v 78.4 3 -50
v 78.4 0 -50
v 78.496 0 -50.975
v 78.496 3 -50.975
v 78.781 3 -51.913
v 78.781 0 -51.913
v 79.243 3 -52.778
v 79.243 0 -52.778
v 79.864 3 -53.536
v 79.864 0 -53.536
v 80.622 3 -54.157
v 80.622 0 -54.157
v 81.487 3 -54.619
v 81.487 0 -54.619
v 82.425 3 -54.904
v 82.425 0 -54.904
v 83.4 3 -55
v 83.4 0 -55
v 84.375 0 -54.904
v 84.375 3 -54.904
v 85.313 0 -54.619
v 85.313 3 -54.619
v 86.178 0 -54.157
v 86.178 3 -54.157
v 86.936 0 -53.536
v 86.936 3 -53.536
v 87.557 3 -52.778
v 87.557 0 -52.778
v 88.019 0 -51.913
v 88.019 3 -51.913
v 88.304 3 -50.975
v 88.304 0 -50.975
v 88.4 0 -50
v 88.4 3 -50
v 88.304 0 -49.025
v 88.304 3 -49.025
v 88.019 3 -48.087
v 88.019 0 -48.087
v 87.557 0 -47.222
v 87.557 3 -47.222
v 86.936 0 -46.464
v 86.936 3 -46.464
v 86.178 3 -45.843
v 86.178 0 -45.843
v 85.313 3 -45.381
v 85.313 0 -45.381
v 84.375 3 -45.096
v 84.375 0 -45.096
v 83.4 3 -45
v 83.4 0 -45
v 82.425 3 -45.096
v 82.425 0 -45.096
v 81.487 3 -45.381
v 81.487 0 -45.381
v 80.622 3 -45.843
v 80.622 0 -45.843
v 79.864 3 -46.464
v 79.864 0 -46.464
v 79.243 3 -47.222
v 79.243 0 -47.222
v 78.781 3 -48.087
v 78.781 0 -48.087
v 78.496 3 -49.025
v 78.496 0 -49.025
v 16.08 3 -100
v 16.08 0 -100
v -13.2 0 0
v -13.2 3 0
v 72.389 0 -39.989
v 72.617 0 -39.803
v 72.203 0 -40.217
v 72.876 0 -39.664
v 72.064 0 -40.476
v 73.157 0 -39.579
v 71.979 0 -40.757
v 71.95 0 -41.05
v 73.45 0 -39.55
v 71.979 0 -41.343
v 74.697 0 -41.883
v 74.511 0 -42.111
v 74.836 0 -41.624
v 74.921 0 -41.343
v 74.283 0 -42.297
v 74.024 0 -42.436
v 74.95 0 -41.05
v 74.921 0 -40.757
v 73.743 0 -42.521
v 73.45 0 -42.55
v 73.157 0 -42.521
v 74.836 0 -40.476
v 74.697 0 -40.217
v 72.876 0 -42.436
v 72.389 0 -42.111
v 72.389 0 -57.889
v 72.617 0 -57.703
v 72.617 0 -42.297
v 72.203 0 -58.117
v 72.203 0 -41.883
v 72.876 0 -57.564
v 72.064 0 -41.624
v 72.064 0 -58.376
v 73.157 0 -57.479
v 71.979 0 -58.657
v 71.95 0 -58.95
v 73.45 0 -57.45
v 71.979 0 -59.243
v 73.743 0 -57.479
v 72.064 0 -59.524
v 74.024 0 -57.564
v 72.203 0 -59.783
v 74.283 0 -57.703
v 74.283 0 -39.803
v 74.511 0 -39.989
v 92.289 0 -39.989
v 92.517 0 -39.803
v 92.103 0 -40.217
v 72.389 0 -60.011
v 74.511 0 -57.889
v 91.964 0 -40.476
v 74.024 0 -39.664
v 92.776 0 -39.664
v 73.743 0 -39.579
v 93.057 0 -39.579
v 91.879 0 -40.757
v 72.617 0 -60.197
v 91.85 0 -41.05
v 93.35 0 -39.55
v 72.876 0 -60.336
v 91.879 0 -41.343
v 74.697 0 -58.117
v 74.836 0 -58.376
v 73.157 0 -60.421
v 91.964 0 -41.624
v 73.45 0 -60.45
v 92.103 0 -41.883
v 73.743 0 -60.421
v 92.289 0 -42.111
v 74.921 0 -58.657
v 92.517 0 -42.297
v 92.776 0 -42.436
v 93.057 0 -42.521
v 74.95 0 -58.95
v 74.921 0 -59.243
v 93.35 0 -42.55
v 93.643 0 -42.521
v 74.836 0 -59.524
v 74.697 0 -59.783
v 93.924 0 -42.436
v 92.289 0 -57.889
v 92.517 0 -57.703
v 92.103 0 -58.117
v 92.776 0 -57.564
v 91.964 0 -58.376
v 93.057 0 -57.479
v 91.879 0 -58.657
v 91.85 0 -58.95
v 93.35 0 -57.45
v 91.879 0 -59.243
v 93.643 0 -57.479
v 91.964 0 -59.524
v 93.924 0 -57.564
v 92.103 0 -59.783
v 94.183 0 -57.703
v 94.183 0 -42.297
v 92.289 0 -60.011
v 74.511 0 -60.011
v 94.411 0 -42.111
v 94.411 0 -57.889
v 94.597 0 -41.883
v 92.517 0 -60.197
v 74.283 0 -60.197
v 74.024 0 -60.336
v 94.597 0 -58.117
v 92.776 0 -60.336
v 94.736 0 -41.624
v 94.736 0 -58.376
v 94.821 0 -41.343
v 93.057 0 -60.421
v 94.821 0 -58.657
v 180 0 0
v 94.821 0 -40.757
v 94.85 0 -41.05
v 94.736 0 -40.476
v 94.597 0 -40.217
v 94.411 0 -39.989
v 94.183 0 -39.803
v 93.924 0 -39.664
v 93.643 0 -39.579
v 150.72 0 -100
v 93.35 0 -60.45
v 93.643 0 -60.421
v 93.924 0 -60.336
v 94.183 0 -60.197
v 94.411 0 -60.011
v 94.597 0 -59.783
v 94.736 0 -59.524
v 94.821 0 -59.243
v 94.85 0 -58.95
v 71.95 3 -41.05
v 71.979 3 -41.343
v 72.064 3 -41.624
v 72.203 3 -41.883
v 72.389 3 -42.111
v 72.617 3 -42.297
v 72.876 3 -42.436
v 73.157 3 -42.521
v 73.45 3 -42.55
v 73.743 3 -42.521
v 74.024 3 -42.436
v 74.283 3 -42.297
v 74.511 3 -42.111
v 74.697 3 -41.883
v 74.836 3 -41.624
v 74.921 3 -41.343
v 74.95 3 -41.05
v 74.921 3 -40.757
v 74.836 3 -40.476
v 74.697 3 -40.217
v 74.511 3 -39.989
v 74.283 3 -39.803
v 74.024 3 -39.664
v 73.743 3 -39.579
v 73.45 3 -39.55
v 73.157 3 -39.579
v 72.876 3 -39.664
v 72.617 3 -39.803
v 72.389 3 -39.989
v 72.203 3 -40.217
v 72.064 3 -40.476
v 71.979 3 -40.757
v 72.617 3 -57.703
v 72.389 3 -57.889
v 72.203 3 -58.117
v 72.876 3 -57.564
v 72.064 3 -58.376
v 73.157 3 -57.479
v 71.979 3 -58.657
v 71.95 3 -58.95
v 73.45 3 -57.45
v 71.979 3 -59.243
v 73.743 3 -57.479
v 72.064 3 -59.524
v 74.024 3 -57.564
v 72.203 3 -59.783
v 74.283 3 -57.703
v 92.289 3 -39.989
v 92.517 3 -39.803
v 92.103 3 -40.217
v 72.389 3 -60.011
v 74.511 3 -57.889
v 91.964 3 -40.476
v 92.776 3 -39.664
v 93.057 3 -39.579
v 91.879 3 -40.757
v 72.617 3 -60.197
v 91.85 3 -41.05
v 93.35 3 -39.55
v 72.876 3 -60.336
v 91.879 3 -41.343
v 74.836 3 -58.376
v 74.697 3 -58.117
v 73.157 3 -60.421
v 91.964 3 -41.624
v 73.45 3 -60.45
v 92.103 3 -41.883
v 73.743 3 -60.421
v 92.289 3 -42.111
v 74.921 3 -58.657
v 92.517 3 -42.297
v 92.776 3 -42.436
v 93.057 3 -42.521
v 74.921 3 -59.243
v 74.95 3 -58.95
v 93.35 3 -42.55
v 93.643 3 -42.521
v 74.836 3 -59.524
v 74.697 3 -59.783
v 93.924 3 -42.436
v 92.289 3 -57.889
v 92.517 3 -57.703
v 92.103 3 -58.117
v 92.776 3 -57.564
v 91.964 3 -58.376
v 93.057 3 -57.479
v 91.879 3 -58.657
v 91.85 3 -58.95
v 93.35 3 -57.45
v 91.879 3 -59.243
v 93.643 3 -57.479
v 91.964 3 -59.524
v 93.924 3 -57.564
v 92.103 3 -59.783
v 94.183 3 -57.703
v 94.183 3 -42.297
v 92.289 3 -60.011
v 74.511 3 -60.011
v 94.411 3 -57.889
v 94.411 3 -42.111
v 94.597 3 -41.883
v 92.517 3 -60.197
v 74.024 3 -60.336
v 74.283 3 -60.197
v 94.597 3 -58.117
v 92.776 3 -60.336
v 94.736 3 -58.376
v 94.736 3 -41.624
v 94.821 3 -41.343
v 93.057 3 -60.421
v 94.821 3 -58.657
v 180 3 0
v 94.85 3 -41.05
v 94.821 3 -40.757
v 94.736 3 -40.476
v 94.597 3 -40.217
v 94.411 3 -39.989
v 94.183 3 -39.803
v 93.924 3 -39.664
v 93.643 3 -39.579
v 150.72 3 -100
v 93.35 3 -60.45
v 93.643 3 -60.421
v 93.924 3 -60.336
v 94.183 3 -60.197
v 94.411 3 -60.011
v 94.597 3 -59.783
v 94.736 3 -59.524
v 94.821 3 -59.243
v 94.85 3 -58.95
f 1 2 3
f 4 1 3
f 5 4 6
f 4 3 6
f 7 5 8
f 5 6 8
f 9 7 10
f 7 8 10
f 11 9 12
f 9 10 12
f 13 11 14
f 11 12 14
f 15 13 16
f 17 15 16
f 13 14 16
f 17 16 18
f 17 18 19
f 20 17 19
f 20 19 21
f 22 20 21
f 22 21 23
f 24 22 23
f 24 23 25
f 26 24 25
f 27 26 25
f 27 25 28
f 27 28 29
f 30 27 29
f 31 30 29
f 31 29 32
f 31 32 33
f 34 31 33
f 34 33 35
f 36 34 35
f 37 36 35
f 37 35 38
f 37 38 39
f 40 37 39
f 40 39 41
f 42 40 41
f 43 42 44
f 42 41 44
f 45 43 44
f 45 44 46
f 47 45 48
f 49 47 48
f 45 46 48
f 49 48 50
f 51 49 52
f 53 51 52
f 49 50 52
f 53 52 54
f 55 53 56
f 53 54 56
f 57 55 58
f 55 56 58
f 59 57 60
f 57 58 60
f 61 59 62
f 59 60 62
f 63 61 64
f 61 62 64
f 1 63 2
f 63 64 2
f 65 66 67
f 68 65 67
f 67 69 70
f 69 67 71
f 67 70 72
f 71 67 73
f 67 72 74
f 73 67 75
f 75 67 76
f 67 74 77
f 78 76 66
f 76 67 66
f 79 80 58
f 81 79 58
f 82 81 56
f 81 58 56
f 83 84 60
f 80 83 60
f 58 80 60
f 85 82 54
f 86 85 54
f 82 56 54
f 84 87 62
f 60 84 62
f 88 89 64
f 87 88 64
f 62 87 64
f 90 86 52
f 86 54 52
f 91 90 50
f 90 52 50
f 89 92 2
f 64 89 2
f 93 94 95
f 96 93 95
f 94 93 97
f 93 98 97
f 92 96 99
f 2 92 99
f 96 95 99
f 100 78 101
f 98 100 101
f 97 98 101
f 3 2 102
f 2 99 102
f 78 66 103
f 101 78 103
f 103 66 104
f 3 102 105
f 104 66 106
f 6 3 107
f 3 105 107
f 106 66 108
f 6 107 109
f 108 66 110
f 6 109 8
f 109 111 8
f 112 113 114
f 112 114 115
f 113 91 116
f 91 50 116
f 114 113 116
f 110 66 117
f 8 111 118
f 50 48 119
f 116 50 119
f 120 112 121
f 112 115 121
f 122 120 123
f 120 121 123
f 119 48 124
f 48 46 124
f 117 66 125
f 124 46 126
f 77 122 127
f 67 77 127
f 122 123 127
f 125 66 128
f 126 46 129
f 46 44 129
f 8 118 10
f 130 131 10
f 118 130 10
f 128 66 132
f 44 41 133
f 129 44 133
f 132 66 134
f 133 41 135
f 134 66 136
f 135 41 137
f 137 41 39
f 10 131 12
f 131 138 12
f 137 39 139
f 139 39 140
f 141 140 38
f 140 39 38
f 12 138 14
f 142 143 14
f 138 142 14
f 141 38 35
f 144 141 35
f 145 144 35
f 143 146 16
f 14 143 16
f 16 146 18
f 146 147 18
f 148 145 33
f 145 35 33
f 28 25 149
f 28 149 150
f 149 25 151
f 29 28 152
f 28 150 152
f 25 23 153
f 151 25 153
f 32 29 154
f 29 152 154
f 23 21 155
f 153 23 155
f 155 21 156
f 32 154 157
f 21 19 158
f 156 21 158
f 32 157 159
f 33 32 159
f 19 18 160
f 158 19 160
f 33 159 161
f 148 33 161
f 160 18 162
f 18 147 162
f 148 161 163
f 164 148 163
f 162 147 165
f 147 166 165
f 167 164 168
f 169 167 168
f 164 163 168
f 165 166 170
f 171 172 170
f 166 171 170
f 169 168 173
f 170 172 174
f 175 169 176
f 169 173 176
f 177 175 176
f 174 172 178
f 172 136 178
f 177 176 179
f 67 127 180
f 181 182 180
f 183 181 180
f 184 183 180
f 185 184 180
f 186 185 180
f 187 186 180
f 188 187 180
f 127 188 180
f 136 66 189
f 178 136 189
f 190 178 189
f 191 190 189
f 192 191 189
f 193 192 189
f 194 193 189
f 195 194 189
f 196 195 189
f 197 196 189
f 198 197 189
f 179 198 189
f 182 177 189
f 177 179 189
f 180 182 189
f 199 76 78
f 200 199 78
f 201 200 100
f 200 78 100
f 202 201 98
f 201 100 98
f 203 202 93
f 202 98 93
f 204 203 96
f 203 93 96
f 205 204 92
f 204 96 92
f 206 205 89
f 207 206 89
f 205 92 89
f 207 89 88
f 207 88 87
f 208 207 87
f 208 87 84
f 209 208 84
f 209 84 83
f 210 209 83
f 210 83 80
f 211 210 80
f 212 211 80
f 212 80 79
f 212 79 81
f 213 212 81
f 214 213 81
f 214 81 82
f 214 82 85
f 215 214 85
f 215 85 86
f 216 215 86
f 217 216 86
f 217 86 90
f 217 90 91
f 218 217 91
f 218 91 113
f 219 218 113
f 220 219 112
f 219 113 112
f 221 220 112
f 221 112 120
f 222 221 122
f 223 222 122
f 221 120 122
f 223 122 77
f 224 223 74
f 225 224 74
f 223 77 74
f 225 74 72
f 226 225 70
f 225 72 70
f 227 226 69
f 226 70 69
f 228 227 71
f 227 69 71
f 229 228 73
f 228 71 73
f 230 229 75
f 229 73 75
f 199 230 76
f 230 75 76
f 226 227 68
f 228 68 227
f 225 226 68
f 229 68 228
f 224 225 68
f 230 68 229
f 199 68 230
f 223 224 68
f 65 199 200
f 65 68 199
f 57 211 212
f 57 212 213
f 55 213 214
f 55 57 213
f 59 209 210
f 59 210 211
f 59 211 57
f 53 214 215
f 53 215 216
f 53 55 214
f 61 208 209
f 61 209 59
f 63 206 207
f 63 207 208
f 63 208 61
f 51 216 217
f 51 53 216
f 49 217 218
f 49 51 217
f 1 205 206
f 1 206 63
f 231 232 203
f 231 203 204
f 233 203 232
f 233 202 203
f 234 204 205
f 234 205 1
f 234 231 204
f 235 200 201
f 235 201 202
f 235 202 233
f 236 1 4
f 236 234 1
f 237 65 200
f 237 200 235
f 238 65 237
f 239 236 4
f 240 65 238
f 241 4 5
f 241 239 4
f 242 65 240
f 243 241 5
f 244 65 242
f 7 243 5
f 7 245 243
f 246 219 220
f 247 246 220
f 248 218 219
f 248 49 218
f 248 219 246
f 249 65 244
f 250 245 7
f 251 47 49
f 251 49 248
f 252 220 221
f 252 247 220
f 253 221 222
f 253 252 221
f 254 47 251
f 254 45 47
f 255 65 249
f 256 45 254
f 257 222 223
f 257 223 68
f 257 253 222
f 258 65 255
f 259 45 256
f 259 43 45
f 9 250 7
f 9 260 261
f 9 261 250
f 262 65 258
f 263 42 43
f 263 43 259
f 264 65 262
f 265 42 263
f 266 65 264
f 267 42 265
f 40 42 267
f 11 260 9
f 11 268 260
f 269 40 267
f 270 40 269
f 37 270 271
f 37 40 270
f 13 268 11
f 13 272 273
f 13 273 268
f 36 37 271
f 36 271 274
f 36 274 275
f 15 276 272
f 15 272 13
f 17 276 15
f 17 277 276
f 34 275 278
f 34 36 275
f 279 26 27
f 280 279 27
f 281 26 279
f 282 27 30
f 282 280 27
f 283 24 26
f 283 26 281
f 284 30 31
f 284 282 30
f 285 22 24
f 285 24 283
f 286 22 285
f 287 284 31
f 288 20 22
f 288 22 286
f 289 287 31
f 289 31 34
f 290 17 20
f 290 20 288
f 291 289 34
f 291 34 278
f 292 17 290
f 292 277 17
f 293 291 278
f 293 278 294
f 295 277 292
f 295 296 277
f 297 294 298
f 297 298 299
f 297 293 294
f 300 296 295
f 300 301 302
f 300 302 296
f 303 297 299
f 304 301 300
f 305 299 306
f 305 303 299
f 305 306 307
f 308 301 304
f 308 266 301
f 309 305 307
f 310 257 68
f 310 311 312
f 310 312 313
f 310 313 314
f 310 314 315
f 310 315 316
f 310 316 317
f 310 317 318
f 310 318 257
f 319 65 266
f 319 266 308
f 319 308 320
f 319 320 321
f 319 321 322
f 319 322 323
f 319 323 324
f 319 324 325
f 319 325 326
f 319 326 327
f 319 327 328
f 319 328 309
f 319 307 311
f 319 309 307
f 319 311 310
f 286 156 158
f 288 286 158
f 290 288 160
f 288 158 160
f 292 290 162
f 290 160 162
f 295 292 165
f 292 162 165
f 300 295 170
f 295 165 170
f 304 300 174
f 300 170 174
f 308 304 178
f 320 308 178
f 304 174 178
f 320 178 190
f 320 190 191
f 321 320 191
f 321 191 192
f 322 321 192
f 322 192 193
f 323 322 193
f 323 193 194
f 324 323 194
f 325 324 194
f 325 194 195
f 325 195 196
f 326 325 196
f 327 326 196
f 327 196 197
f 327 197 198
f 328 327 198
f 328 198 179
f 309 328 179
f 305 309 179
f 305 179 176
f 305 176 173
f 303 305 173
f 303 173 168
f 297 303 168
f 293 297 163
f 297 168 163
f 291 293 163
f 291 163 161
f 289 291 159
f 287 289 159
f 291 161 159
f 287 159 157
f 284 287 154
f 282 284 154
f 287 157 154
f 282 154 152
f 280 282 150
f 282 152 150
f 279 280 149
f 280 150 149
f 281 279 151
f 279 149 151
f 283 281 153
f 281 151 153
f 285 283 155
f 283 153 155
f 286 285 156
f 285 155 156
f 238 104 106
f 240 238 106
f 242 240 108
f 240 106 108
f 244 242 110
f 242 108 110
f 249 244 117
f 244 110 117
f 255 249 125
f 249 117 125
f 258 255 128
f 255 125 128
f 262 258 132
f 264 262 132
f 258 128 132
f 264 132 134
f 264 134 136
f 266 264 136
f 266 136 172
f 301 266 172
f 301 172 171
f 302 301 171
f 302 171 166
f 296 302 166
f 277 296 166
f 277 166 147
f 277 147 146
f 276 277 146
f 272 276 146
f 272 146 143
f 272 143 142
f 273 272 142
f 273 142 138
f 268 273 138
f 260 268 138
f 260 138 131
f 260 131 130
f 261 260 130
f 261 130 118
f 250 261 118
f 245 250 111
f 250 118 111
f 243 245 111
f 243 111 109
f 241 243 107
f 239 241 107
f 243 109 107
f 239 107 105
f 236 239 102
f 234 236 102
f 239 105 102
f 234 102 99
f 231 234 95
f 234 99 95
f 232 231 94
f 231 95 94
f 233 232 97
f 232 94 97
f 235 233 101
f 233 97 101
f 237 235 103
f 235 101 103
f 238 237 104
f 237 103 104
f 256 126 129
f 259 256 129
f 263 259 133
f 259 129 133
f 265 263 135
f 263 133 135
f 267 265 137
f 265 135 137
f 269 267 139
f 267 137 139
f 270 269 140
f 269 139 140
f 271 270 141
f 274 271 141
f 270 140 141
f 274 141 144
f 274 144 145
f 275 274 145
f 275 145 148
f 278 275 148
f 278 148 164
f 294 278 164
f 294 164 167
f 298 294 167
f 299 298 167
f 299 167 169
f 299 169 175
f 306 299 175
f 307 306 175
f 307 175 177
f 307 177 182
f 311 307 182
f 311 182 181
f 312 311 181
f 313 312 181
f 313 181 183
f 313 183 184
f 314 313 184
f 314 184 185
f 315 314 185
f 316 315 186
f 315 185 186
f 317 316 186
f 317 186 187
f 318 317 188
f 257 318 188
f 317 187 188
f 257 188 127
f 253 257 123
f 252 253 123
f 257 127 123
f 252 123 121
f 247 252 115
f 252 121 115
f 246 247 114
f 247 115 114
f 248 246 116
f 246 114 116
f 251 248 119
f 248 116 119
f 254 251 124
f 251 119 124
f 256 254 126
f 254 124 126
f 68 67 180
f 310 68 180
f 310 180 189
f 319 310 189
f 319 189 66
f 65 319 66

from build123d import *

# Parameters (mm, degrees)
BOSS_EXTRUDE1_DEPTH        = 3
F_10_0MM_DOWEL_HOLE1_D     = 10
F_10_0MM_DOWEL_HOLE1_DEPTH = 3
F_3_0MM_DOWEL_HOLE1_D      = 3
F_3_0MM_DOWEL_HOLE1_DEPTH  = 3


with BuildPart() as part:
    # Sketch1 → Boss-Extrude1 (new body)
    with BuildSketch(Plane(origin=(0, 0, 0), x_dir=(1, 0, 0), z_dir=(0, 1, 0))):
        Polygon((-13.2, 0), (180, 0), (150.720058283, 100), (16.079941717, 100), align=None)
    extrude(amount=BOSS_EXTRUDE1_DEPTH)

    # Ø10.0mm Dowel Hole1
    with Locations(Plane(origin=(0, 3, 0), x_dir=(1, 0, 0), z_dir=(0, 1, 0))):
        with Locations((83.4, 50)):
            Hole(F_10_0MM_DOWEL_HOLE1_D / 2, depth=F_10_0MM_DOWEL_HOLE1_DEPTH)

    # Ø3.0mm Dowel Hole1
    with Locations(Plane(origin=(0, 3, 0), x_dir=(1, 0, 0), z_dir=(0, 1, 0))):
        with Locations((73.45, 58.95), (73.45, 41.05), (93.35, 41.05), (93.35, 58.95)):
            Hole(F_3_0MM_DOWEL_HOLE1_D / 2, depth=F_3_0MM_DOWEL_HOLE1_DEPTH)


solid = part.part
